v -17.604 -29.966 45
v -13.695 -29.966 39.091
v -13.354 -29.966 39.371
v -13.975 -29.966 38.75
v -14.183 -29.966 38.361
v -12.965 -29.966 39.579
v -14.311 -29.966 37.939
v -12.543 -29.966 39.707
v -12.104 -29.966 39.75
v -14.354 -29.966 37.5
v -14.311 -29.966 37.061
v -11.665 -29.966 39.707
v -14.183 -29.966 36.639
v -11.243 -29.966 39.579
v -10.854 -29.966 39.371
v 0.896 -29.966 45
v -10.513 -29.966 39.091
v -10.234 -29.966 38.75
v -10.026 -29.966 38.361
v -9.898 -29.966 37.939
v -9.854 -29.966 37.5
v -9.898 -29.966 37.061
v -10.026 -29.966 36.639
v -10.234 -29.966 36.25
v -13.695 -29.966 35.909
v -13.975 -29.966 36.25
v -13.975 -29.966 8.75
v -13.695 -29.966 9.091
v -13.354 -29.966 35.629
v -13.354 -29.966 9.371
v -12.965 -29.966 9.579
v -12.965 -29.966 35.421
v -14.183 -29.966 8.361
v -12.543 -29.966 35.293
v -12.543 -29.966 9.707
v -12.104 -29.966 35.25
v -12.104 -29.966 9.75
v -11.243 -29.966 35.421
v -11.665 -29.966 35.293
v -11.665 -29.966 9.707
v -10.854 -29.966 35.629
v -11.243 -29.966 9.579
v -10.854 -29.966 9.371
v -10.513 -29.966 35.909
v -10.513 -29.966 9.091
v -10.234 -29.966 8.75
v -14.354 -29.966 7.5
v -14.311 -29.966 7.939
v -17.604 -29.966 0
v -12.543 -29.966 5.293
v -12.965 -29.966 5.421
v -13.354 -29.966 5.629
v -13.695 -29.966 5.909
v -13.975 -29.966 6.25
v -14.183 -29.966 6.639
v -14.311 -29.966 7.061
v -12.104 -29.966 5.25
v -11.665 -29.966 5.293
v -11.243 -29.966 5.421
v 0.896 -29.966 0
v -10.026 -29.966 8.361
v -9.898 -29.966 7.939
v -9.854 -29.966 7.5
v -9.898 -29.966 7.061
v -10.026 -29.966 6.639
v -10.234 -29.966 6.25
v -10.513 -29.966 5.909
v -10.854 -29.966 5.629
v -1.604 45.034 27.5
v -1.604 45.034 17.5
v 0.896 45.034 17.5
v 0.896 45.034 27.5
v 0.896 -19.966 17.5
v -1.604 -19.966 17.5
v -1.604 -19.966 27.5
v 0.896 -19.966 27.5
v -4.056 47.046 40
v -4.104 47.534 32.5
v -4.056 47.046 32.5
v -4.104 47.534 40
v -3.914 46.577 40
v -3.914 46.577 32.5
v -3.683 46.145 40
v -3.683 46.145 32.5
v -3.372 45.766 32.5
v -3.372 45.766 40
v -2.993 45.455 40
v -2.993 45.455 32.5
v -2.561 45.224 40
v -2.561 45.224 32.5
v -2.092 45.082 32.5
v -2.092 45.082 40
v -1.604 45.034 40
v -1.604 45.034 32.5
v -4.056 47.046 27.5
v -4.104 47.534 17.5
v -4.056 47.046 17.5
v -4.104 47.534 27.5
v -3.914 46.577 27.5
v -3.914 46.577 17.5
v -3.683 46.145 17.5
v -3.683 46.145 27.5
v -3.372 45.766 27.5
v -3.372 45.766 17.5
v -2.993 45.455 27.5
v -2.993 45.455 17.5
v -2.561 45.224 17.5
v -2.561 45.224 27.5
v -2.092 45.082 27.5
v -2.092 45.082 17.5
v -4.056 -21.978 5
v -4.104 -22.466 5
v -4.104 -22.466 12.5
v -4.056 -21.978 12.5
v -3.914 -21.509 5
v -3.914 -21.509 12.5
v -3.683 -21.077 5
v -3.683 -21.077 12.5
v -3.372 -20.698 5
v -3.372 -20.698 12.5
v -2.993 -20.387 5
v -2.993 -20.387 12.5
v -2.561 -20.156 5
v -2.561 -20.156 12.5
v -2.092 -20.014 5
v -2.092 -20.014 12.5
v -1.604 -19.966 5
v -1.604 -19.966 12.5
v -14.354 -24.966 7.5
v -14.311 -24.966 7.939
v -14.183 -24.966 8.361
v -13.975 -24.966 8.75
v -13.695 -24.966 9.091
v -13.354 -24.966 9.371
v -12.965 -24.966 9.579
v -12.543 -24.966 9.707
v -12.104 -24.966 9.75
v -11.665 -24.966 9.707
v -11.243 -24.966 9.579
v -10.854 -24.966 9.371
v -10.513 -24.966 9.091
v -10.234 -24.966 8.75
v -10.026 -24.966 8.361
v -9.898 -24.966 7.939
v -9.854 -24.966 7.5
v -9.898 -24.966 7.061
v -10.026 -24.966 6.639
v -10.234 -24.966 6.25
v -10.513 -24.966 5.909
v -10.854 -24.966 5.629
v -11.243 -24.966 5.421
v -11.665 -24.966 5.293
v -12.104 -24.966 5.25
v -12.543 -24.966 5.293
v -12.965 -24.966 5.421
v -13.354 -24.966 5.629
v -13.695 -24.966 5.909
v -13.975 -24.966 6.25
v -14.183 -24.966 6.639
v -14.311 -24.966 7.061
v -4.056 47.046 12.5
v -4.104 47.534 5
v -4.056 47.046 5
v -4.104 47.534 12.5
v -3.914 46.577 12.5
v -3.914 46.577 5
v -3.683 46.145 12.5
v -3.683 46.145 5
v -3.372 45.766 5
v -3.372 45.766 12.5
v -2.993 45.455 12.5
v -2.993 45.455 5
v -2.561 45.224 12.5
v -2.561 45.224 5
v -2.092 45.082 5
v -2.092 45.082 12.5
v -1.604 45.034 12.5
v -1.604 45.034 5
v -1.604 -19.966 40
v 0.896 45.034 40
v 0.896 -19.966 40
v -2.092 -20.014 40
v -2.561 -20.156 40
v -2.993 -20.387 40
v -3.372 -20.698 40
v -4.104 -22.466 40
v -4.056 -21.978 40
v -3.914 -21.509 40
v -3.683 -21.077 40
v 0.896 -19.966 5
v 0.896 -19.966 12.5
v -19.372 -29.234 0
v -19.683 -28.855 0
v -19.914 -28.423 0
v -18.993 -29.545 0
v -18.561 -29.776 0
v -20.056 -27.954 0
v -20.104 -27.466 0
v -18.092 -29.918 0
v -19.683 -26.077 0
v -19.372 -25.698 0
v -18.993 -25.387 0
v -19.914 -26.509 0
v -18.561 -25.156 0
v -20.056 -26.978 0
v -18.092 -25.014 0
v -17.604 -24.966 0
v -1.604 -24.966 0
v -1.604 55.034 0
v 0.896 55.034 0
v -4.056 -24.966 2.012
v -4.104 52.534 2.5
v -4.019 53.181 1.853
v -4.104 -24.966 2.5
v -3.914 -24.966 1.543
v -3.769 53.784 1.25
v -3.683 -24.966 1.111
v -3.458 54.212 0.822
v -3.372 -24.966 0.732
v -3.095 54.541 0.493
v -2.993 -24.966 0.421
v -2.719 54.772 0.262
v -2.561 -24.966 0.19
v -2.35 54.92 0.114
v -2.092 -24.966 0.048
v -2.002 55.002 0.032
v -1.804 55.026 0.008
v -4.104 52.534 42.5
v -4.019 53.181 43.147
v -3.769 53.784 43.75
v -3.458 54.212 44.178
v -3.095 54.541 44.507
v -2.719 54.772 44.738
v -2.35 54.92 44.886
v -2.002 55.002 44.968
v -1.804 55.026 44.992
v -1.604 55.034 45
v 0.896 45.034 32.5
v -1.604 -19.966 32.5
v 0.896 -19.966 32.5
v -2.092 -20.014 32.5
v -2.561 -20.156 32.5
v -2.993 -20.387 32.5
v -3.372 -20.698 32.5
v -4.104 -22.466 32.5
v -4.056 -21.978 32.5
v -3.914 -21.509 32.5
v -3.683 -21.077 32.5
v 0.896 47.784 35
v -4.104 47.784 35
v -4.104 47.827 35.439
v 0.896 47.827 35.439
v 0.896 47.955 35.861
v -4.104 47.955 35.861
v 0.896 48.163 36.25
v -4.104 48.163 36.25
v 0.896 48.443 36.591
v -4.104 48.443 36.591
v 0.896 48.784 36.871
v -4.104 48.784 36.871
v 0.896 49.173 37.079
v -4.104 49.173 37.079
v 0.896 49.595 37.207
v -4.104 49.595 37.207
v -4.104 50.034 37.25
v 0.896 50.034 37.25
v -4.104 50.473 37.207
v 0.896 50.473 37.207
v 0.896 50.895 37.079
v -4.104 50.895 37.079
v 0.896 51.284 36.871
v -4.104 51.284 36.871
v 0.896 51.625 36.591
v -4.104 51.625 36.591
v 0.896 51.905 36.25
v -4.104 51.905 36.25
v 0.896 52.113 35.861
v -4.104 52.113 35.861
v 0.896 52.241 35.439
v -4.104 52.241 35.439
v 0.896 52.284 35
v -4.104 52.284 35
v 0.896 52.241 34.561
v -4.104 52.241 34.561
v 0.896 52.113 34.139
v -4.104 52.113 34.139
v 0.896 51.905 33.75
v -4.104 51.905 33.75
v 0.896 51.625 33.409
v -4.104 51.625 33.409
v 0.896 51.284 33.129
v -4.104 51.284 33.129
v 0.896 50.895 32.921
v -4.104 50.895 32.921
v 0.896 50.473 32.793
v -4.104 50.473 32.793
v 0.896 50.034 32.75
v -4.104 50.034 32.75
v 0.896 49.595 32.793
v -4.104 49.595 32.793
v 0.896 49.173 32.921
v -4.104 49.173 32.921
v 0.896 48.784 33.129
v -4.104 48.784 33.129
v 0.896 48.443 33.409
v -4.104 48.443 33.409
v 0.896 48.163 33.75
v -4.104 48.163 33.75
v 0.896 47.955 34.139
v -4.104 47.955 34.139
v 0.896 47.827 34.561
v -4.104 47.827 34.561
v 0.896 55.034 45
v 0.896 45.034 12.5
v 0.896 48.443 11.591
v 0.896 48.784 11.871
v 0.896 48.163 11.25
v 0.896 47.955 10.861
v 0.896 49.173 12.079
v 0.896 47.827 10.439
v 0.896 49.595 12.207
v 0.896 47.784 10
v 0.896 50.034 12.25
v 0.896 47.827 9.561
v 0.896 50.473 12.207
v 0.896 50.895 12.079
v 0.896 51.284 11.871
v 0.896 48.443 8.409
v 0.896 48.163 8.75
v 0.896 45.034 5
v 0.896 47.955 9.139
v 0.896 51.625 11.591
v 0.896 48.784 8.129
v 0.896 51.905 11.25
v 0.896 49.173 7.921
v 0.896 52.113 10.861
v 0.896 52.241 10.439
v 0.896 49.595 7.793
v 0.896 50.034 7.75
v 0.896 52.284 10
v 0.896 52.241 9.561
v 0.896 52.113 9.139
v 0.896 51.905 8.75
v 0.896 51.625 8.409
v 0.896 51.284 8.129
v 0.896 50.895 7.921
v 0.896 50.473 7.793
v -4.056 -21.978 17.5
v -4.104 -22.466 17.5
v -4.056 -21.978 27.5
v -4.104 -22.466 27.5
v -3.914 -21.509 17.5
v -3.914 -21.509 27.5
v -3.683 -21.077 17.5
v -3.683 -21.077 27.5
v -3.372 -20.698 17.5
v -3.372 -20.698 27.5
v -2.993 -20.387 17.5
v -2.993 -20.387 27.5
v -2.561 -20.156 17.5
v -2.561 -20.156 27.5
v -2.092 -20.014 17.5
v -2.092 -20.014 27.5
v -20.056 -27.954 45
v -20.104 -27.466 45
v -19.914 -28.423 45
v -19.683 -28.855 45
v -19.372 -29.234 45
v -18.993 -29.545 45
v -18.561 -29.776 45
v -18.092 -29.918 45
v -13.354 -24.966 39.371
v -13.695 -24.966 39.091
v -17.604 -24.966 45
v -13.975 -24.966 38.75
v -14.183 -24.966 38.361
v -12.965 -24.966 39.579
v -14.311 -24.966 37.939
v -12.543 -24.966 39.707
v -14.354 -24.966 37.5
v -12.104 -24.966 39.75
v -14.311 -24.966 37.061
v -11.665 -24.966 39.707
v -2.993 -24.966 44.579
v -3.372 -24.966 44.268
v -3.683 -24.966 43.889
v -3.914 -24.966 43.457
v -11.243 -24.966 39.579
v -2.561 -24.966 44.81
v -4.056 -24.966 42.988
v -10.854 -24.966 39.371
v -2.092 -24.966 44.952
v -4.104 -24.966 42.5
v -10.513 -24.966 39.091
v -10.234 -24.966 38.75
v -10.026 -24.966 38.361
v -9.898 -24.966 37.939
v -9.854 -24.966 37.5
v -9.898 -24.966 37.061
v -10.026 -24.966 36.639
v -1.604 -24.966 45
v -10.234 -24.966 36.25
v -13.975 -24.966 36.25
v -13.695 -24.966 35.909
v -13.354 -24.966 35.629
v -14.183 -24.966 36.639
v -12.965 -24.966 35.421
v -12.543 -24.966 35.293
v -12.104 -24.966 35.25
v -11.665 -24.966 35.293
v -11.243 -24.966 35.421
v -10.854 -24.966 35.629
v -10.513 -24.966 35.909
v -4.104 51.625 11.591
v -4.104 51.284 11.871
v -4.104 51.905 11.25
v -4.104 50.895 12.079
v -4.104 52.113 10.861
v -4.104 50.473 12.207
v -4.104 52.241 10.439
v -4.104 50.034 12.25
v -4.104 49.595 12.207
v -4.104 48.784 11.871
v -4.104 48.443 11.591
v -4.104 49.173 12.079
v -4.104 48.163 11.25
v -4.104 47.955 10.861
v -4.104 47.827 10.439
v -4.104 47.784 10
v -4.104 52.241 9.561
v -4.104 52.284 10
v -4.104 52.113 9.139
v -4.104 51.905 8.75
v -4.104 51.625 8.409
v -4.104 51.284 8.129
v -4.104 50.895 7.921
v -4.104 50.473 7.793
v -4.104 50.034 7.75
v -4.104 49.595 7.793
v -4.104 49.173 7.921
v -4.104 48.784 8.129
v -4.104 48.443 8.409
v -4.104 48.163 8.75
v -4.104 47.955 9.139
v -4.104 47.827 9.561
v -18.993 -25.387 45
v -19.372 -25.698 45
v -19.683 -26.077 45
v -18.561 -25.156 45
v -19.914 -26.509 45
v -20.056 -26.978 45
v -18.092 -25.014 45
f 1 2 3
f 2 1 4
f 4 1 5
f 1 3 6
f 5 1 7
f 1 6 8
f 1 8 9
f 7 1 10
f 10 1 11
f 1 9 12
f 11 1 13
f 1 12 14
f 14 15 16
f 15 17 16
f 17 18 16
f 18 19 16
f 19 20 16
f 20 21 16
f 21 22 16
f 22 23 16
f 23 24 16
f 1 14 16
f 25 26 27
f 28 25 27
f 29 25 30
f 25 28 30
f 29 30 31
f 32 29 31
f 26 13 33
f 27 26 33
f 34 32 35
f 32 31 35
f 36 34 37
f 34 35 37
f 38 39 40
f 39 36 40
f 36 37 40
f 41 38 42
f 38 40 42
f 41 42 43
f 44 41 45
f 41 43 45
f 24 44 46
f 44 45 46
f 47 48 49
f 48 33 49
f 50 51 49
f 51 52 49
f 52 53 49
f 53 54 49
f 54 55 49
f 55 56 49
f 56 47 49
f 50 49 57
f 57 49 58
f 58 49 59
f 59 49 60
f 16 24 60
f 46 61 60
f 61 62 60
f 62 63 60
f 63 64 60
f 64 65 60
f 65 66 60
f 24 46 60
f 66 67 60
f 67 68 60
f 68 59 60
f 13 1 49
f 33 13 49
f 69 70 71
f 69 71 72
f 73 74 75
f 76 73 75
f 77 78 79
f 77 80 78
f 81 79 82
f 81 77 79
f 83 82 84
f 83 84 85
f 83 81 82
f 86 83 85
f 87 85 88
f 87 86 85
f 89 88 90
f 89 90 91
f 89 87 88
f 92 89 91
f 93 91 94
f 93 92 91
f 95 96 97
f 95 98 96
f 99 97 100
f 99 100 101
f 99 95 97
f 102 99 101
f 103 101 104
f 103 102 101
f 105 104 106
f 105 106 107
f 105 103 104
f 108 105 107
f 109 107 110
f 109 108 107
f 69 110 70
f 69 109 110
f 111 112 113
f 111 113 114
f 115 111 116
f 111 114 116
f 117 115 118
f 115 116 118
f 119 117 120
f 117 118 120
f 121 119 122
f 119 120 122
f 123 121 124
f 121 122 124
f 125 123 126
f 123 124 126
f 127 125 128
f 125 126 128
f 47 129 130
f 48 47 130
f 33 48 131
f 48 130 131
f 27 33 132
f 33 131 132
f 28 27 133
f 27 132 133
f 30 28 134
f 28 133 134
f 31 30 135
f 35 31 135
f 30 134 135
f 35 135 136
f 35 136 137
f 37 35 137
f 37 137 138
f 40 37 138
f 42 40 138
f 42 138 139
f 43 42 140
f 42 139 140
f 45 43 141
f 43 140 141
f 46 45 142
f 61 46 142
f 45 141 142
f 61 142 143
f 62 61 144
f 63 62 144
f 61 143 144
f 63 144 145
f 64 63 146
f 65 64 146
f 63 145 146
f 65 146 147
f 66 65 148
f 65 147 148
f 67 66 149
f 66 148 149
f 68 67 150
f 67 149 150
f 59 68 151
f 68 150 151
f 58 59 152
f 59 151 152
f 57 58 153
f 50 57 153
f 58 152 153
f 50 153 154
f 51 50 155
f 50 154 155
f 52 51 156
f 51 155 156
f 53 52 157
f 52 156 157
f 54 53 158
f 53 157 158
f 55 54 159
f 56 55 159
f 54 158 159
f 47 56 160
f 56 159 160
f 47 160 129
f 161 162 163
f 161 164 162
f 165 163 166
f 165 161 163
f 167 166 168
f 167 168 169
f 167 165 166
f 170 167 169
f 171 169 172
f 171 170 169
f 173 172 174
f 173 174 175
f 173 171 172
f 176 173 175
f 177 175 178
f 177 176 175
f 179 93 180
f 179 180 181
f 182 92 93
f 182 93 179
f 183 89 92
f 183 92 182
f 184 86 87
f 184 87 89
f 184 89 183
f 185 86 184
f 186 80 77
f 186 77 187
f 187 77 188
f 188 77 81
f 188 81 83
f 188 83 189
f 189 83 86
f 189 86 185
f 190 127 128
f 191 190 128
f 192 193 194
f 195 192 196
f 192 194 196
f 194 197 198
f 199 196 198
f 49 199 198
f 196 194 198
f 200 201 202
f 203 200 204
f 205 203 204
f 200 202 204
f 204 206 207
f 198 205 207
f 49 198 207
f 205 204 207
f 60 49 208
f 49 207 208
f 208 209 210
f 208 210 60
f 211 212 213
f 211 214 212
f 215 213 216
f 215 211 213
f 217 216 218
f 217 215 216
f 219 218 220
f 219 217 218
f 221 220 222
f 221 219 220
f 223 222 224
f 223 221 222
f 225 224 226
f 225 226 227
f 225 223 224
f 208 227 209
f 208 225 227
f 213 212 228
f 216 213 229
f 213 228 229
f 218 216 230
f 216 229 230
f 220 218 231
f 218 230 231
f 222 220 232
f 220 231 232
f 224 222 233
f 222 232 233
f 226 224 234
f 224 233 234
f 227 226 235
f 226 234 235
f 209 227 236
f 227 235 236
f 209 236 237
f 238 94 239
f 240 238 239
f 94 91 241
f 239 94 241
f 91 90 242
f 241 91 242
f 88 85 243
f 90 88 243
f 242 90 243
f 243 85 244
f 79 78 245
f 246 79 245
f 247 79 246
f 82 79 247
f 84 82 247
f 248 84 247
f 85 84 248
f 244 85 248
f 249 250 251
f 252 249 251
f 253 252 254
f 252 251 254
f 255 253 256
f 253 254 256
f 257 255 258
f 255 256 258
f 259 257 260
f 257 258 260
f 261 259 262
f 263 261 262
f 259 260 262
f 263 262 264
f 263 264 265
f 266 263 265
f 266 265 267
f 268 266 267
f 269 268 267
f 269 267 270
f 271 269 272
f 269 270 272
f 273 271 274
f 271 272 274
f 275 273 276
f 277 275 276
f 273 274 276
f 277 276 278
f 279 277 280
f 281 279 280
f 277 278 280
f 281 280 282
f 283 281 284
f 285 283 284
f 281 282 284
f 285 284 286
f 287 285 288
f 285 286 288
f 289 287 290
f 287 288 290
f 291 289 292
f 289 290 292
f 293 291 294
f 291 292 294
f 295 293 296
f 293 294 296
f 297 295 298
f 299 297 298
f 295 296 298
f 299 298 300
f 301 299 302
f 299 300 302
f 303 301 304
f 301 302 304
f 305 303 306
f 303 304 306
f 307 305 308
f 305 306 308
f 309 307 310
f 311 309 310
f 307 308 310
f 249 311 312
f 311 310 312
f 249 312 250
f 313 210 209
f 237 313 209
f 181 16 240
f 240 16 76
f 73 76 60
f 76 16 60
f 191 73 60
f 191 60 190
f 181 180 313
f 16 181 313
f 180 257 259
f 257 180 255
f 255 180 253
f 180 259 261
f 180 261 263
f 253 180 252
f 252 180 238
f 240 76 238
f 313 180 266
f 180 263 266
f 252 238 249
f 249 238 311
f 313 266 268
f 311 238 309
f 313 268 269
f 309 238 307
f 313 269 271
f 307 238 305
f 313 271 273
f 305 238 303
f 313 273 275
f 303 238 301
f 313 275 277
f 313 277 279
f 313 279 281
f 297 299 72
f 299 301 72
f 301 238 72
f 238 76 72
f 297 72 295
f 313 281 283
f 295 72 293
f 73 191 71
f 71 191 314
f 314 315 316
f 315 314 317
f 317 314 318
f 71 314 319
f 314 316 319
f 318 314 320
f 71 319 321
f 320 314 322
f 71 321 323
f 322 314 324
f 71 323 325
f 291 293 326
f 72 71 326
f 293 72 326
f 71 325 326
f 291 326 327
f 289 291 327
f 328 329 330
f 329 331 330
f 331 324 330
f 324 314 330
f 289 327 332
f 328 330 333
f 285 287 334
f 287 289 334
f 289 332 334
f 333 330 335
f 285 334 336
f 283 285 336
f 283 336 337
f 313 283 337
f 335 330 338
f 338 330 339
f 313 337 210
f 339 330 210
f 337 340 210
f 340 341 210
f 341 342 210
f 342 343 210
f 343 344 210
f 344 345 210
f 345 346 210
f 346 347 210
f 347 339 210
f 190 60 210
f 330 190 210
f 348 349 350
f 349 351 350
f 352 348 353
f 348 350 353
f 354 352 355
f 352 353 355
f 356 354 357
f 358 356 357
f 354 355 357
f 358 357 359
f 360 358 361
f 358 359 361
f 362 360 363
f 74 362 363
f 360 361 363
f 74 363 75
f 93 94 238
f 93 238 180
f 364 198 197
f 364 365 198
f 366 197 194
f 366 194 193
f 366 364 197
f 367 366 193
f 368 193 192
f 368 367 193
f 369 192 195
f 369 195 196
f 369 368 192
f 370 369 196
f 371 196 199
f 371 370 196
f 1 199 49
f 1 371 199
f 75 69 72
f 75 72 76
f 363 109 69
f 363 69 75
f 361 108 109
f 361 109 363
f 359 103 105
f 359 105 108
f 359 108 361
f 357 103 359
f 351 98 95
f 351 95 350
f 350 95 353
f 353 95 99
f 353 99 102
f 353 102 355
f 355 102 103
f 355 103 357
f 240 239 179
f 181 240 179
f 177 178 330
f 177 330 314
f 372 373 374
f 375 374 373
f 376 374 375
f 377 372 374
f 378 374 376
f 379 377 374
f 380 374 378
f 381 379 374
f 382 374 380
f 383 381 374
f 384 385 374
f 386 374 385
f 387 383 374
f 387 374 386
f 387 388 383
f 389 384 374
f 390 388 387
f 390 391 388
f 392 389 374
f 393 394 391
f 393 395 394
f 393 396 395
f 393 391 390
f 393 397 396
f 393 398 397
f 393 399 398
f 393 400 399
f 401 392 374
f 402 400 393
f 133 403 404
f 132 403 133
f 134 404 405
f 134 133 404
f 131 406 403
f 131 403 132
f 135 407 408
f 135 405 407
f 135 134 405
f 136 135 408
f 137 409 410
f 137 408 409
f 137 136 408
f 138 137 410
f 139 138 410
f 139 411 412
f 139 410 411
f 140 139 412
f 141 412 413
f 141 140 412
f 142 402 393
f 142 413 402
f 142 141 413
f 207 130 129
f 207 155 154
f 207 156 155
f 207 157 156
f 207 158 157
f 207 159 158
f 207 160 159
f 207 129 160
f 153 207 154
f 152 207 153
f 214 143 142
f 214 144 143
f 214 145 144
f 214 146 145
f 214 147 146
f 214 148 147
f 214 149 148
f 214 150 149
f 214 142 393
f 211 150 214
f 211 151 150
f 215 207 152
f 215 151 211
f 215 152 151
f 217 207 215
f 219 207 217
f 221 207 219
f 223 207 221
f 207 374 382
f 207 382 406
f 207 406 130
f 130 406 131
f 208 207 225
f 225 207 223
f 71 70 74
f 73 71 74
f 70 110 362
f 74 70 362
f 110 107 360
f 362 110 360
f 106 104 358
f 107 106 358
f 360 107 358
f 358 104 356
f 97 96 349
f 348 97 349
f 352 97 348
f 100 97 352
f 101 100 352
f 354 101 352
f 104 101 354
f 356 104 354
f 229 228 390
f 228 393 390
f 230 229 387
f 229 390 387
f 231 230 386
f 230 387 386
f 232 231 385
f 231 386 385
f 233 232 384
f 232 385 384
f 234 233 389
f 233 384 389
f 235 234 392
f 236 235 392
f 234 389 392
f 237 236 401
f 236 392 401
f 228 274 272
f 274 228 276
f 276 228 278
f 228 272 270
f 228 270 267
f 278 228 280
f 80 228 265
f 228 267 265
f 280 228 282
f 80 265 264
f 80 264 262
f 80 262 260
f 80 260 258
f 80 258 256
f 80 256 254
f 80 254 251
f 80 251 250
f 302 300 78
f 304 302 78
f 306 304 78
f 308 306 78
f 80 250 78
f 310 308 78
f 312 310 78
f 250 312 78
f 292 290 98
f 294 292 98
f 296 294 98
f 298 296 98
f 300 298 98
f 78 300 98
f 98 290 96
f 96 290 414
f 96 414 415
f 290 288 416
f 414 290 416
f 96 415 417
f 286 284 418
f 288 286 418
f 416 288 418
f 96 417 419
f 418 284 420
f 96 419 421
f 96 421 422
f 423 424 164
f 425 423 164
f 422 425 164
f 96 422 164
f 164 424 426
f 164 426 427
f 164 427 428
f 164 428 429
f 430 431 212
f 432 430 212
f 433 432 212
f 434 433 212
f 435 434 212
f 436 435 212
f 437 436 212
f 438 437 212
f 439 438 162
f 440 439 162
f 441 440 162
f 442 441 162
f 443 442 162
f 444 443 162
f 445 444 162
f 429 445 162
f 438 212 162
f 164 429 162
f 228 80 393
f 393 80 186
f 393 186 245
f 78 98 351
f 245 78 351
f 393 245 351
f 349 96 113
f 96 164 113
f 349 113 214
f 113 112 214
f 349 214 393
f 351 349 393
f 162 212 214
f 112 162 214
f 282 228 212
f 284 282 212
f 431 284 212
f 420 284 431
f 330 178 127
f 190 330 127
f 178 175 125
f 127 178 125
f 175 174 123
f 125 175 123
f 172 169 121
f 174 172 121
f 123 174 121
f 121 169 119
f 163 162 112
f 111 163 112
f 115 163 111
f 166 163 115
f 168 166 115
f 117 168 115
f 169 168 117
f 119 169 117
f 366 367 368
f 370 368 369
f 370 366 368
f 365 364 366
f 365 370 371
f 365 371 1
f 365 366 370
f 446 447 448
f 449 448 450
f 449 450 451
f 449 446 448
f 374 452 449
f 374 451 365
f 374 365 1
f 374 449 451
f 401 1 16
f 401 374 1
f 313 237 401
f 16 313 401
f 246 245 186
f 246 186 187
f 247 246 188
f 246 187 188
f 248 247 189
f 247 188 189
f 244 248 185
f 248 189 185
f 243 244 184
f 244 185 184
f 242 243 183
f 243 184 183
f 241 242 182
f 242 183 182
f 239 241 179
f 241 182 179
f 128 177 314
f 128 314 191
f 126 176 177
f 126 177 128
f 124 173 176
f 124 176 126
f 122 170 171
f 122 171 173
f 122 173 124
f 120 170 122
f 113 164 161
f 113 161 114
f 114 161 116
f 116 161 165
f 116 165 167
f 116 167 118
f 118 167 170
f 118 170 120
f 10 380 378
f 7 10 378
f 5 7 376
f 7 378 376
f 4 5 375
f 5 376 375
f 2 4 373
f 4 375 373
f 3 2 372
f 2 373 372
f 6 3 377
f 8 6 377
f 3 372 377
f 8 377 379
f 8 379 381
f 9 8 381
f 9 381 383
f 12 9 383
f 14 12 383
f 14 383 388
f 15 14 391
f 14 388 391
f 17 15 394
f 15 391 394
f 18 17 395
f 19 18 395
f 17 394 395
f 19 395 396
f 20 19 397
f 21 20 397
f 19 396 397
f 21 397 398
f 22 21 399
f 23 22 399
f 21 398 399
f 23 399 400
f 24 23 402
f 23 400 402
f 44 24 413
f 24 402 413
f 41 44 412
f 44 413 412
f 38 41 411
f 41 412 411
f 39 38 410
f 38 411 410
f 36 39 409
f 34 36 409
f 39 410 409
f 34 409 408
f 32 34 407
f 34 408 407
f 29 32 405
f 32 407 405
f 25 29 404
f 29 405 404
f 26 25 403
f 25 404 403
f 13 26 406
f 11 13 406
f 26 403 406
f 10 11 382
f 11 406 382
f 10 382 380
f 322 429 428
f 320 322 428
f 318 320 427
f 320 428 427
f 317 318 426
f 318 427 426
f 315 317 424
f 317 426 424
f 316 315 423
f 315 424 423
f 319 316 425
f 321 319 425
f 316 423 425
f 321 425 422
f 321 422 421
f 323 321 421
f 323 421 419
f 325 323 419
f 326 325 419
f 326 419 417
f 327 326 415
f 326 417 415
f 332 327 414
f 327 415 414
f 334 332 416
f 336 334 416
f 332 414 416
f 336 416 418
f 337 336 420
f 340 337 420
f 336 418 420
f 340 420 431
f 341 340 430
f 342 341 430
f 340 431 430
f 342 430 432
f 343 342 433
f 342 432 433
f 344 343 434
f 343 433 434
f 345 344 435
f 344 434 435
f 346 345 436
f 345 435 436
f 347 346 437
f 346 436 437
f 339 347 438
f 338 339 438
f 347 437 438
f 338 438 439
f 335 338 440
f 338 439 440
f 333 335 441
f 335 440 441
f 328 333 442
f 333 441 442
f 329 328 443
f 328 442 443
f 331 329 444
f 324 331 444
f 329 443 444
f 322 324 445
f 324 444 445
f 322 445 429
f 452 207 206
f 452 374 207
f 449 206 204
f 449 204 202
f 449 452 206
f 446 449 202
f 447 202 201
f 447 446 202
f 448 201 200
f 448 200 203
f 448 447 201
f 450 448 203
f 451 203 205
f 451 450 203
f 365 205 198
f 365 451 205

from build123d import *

# Parameters (mm, degrees)
F0_W     = 16
F0_H     = 5
F1_DEPTH = 45
F2_R     = 2.25
F3_DEPTH = 5
F4_W     = 65
F4_H     = 7.5
F4_R     = 2.25
F4_H_2   = 10
F5_DEPTH = 5
F6_R     = 2.49999


# Not quite as in the source:
# - a fillet or chamfer is up to 0.001 mm smaller than in the source, because OpenCascade refuses the exact size
# - a feature names something its author has since deleted; it is built from what else it names


with BuildPart() as f1:
    # F0 (on Top) → F1 (new body)
    with BuildSketch(Plane.XY):
        Polygon((-4.1043104958, 55.0339419188), (-4.1043104958, -24.9660580812), (-4.1043104958, -29.9660580812), (0.8956895042, -29.9660580812), (0.8956895042, 55.0339419188), align=None)
        with Locations((-12.1043104958, -27.4660580812)):
            Rectangle(F0_W, F0_H)
    extrude(amount=F1_DEPTH)

    # F2 (on face) → F3 (cut, through all)
    with BuildSketch(Plane(origin=(0, -24.9660580812, 0), x_dir=(-1, 0, 0), z_dir=(0, 1, 0))):
        with Locations((12.1043104958, 7.5)):
            Circle(F2_R)
        with Locations((12.1043104958, 37.5)):
            Circle(F2_R)
    extrude(amount=-F3_DEPTH, mode=Mode.SUBTRACT)

    # F4 (on face) → F5 (cut, through all)
    with BuildSketch(Plane(origin=(-4.1043104958, 0, 0), x_dir=(0, -1, 0), z_dir=(-1, 0, 0))):
        with Locations((-12.5339419188, 8.75)):
            Rectangle(F4_W, F4_H)
        with Locations((-50.0339419188, 35)):
            Circle(F4_R)
        with Locations((-50.0339419188, 10)):
            Circle(F4_R)
        with Locations((-12.5339419188, 22.5)):
            Rectangle(F4_W, F4_H_2)
        with Locations((-12.5339419188, 36.25)):
            Rectangle(F4_W, F4_H)
    extrude(amount=-F5_DEPTH, mode=Mode.SUBTRACT)

    # F6 (radius 2.5 in the source; OpenCascade refuses exactly that, so slightly less here)
    f6_edges = [f1.edges().sort_by_distance(p)[0] for p in [
        (-4.10431, 15.033942, 0),
        (-4.10431, 55.033942, 22.5),
        (-4.10431, 15.033942, 45),
        (-4.10431, 45.033942, 8.75),
        (-4.10431, 45.033942, 22.5),
        (-4.10431, 45.033942, 36.25),
        (-4.10431, -19.966058, 8.75),
        (-4.10431, -19.966058, 22.5),
        (-4.10431, -19.966058, 36.25),
        (-20.10431, -24.966058, 22.5),
        (-20.10431, -29.966058, 22.5),
    ]]
    fillet(f6_edges, radius=F6_R)


solid = f1.part
